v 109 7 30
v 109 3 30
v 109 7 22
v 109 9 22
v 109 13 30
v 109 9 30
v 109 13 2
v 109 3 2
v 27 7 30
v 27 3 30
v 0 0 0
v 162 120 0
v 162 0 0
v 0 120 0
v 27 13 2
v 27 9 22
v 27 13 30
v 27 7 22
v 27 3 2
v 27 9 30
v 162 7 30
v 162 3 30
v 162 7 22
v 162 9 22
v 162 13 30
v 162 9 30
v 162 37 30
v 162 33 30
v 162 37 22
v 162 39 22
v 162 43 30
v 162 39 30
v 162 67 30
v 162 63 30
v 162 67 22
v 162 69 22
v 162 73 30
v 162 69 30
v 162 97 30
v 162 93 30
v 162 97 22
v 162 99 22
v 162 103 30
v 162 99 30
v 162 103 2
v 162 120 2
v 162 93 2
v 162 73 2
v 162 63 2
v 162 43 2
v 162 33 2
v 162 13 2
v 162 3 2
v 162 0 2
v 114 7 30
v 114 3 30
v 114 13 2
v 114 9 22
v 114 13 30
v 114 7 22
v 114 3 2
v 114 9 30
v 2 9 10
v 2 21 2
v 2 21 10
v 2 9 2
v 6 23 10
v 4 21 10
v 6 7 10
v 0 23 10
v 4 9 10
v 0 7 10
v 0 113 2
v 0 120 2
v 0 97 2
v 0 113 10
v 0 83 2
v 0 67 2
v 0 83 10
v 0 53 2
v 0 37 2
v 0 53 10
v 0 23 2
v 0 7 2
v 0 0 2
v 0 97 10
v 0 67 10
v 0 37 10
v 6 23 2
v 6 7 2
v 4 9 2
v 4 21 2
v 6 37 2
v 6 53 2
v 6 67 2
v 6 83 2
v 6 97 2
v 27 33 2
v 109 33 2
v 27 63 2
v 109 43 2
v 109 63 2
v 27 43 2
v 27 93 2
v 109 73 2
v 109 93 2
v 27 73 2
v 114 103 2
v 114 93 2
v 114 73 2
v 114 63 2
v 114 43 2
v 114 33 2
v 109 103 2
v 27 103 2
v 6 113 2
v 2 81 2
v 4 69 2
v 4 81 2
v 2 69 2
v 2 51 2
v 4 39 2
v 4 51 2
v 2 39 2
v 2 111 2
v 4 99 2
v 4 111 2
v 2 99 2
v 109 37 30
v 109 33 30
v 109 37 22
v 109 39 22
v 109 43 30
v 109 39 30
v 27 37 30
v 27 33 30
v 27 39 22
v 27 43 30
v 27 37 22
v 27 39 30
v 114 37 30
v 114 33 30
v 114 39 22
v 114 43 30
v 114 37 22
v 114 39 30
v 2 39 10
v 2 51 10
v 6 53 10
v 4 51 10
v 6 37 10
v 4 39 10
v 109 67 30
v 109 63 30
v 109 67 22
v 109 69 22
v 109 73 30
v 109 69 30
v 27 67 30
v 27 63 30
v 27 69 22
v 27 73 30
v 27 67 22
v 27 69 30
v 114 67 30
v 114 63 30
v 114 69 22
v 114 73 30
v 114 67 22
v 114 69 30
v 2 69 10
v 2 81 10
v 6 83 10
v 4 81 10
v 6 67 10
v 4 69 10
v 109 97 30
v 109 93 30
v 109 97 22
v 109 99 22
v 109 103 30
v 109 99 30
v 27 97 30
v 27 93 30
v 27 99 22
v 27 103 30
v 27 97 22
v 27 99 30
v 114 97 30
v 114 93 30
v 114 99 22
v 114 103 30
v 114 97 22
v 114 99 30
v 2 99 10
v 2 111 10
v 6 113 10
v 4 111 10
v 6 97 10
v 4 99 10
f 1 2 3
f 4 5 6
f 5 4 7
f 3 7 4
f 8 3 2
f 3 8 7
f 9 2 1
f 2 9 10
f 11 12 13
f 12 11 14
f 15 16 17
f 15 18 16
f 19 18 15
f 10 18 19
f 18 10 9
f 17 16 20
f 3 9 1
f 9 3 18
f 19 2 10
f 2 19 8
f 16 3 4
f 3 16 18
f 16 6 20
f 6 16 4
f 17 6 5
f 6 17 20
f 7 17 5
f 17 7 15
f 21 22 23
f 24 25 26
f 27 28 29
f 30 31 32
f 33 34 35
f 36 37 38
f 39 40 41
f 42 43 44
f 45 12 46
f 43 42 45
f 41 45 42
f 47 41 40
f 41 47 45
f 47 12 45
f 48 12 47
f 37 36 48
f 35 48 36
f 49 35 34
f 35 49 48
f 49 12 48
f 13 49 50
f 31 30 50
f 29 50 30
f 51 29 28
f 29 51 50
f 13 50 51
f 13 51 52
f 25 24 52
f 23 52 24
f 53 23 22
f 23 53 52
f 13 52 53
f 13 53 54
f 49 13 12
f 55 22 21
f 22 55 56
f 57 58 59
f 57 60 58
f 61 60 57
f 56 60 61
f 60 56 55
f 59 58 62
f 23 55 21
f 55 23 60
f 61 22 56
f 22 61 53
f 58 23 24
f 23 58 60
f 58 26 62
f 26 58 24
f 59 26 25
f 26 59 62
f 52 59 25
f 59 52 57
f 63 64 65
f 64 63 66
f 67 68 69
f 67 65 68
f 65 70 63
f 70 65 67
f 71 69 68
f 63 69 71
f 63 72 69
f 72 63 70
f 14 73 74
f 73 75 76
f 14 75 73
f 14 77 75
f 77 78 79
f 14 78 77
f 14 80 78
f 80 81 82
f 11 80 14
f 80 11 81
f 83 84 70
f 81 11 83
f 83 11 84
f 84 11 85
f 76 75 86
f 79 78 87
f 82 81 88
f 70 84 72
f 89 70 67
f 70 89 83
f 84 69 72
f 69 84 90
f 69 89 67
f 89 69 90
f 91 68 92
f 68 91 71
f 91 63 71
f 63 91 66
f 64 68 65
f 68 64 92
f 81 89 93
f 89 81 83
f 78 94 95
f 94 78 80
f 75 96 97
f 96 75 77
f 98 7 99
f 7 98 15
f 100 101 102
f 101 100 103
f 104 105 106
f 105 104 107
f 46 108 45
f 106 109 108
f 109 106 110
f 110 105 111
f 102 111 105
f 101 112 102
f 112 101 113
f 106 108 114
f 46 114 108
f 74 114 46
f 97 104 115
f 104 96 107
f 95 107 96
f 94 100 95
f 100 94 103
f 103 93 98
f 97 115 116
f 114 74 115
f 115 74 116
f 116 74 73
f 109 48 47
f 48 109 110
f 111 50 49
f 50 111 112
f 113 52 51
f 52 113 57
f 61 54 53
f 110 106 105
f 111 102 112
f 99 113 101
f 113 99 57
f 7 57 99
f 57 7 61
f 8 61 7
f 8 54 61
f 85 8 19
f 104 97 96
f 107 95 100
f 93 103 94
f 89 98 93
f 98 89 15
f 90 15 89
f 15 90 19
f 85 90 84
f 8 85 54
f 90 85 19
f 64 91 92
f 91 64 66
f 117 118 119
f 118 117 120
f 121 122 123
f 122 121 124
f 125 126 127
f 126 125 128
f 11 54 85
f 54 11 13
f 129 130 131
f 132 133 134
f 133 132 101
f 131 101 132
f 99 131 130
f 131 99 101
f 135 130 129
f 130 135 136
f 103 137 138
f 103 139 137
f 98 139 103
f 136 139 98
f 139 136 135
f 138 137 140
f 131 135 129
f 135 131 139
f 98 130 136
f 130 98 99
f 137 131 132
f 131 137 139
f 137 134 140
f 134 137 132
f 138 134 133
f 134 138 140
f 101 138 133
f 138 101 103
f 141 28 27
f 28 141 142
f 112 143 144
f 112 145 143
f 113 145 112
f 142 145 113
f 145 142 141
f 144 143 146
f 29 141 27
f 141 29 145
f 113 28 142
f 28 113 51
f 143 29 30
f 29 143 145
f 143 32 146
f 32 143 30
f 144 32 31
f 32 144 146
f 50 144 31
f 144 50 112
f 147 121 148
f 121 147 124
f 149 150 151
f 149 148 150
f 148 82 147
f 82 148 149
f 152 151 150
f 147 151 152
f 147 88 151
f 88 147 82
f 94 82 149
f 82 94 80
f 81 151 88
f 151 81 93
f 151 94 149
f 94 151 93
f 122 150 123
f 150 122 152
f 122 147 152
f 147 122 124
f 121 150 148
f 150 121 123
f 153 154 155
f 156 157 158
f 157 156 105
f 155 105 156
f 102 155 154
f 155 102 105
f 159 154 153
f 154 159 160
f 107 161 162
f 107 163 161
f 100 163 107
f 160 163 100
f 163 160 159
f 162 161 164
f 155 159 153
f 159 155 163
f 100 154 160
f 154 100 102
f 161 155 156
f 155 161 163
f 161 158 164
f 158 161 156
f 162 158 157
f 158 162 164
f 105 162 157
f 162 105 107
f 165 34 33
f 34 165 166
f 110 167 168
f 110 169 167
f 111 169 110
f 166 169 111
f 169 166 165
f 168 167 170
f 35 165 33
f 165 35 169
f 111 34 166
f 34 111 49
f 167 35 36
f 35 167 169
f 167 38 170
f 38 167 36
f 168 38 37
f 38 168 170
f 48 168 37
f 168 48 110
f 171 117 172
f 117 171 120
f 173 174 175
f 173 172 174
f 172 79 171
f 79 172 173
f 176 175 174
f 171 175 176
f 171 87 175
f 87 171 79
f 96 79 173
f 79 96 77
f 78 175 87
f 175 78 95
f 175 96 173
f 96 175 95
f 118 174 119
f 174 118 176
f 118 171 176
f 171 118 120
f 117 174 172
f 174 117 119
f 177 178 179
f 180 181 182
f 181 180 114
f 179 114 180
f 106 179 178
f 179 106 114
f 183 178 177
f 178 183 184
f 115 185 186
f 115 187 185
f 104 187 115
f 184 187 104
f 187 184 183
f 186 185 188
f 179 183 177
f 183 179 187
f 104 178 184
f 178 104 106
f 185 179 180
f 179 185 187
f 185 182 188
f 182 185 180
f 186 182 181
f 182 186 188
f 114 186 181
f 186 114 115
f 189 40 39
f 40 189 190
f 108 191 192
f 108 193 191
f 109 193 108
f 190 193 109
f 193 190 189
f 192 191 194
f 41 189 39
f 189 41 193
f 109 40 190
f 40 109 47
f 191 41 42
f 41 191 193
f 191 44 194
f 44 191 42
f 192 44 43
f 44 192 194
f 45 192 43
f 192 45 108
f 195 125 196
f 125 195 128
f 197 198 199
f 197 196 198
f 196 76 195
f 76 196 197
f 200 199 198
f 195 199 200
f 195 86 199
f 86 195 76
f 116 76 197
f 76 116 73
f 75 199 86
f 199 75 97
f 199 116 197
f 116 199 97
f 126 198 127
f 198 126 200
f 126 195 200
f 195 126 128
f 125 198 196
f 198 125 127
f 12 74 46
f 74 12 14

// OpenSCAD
// file: ../cardshowcase.scad
module base_tarjeta(desplazamiento, posicion_tarjeta, longitud_tarjeta, altura_borde_tarjeta, altura_interior_tarjeta)
{
    color("purple") translate([ posicion_tarjeta, desplazamiento + 1, 0 ])
        cube([ longitud_tarjeta, 4, altura_borde_tarjeta + 2 ]);

    color("pink") translate([ posicion_tarjeta, desplazamiento + 5, 0 ])
        cube([ longitud_tarjeta, 2, altura_interior_tarjeta + 2 ]);

    color("purple") translate([ posicion_tarjeta, desplazamiento + 7, 0 ])
        cube([ longitud_tarjeta, 4, altura_borde_tarjeta + 2 ]);
}

module base_tarjeta_corta(desplazamiento, posicion_tarjeta, longitud_tarjeta, altura_borde_tarjeta,
                          altura_interior_tarjeta, tab_size)
{
    color("purple") translate([ posicion_tarjeta, desplazamiento + 1, 0 ])
        cube([ tab_size, 4, altura_borde_tarjeta + 2 ]);

    color("pink") translate([ posicion_tarjeta, desplazamiento + 5, 0 ])
        cube([ tab_size, 2, altura_interior_tarjeta + 2 ]);

    color("purple") translate([ posicion_tarjeta, desplazamiento + 7, 0 ])
        cube([ tab_size, 4, altura_borde_tarjeta + 2 ]);

    color("purple") translate([ longitud_tarjeta + posicion_tarjeta - tab_size, desplazamiento + 1, 0 ])
        cube([ tab_size, 4, altura_borde_tarjeta + 2 ]);

    color("pink") translate([ longitud_tarjeta + posicion_tarjeta - tab_size, desplazamiento + 5, 0 ])
        cube([ tab_size, 2, altura_interior_tarjeta + 2 ]);

    color("purple") translate([ longitud_tarjeta + posicion_tarjeta - tab_size, desplazamiento + 7, 0 ])
        cube([ tab_size, 4, altura_borde_tarjeta + 2 ]);
}

module soporte_tarjeta(tipo, size)
{
    if (tipo == "ISA8")
    {
        desplazamiento = 2;
        posicion_tarjeta = 27;
        longitud_tarjeta = 82;
        altura_borde_tarjeta = 28;
        altura_interior_tarjeta = 20;

        if (size == 0)
        {
            base_tarjeta(desplazamiento, posicion_tarjeta, longitud_tarjeta, altura_borde_tarjeta,
                         altura_interior_tarjeta);
        }
        else
        {
            base_tarjeta_corta(desplazamiento, posicion_tarjeta, longitud_tarjeta, altura_borde_tarjeta,
                               altura_interior_tarjeta, size);
        }
    }
    else if (tipo == "ISA16")
    {
        soporte_tarjeta("ISA8", size);

        desplazamiento = 2;
        posicion_tarjeta = 28 + 81 + 5;
        longitud_tarjeta = 48;
        altura_borde_tarjeta = 28;
        altura_interior_tarjeta = 20;

        if (size == 0)
        {
            base_tarjeta(desplazamiento, posicion_tarjeta, longitud_tarjeta, altura_borde_tarjeta,
                         altura_interior_tarjeta);
        }
        else
        {
            base_tarjeta_corta(desplazamiento, posicion_tarjeta, longitud_tarjeta, altura_borde_tarjeta,
                               altura_interior_tarjeta, size);
        }
    }
    else if (tipo == "VLB")
    {
        soporte_tarjeta("ISA16", size);

        desplazamiento = 2;
        posicion_tarjeta = 28 + 135 + 8;
        longitud_tarjeta = 75;
        altura_borde_tarjeta = 28;
        altura_interior_tarjeta = 20;

        if (size == 0)
        {
            base_tarjeta(desplazamiento, posicion_tarjeta, longitud_tarjeta, altura_borde_tarjeta,
                         altura_interior_tarjeta);
        }
        else
        {
            base_tarjeta_corta(desplazamiento, posicion_tarjeta, longitud_tarjeta, altura_borde_tarjeta,
                               altura_interior_tarjeta, size);
        }
    }
    else if (tipo == "PCI")
    {
        desplazamiento = 16;
        posicion_tarjeta = 43;
        longitud_tarjeta = 82;
        altura_borde_tarjeta = 28;
        altura_interior_tarjeta = 20;

        if (size == 0)
        {
            base_tarjeta(desplazamiento, posicion_tarjeta, longitud_tarjeta, altura_borde_tarjeta,
                         altura_interior_tarjeta);
        }
        else
        {
            base_tarjeta_corta(desplazamiento, posicion_tarjeta, longitud_tarjeta, altura_borde_tarjeta,
                               altura_interior_tarjeta, size);
        }
    }
    else if (tipo == "PCIe16")
    {
        desplazamiento = 16;
        posicion_tarjeta = 50;
        longitud_tarjeta = 85;
        altura_borde_tarjeta = 24;
        altura_interior_tarjeta = 16;

        if (size == 0)
        {
            base_tarjeta(desplazamiento, posicion_tarjeta, longitud_tarjeta, altura_borde_tarjeta,
                         altura_interior_tarjeta);
        }
        else
        {
            base_tarjeta_corta(desplazamiento, posicion_tarjeta, longitud_tarjeta, altura_borde_tarjeta,
                               altura_interior_tarjeta, size);
        }
    }
    else if (tipo == "PCIe8")
    {
        desplazamiento = 16;
        posicion_tarjeta = 50;
        longitud_tarjeta = 52;
        altura_borde_tarjeta = 24;
        altura_interior_tarjeta = 16;

        if (size == 0)
        {
            base_tarjeta(desplazamiento, posicion_tarjeta, longitud_tarjeta, altura_borde_tarjeta,
                         altura_interior_tarjeta);
        }
        else
        {
            base_tarjeta_corta(desplazamiento, posicion_tarjeta, longitud_tarjeta, altura_borde_tarjeta,
                               altura_interior_tarjeta, size);
        }
    }
    else if (tipo == "PCIe4")
    {
        desplazamiento = 16;
        posicion_tarjeta = 50;
        longitud_tarjeta = 35;
        altura_borde_tarjeta = 24;
        altura_interior_tarjeta = 16;

        if (size == 0)
        {
            base_tarjeta(desplazamiento, posicion_tarjeta, longitud_tarjeta, altura_borde_tarjeta,
                         altura_interior_tarjeta);
        }
        else
        {
            base_tarjeta_corta(desplazamiento, posicion_tarjeta, longitud_tarjeta, altura_borde_tarjeta,
                               altura_interior_tarjeta, size);
        }
    }
    else if (tipo == "PCIe1")
    {
        desplazamiento = 16;
        posicion_tarjeta = 50;
        longitud_tarjeta = 21;
        altura_borde_tarjeta = 24;
        altura_interior_tarjeta = 16;

        if (size == 0)
        {
            base_tarjeta(desplazamiento, posicion_tarjeta, longitud_tarjeta, altura_borde_tarjeta,
                         altura_interior_tarjeta);
        }
        else
        {
            base_tarjeta_corta(desplazamiento, posicion_tarjeta, longitud_tarjeta, altura_borde_tarjeta,
                               altura_interior_tarjeta, size);
        }
    }
    else if (tipo == "AGP")
    {
        desplazamiento = 16;
        posicion_tarjeta = 70;
        longitud_tarjeta = 68;
        altura_borde_tarjeta = 28;
        altura_interior_tarjeta = 20;

        if (size == 0)
        {
            base_tarjeta(desplazamiento, posicion_tarjeta, longitud_tarjeta, altura_borde_tarjeta,
                         altura_interior_tarjeta);
        }
        else
        {
            base_tarjeta_corta(desplazamiento, posicion_tarjeta, longitud_tarjeta, altura_borde_tarjeta,
                               altura_interior_tarjeta, size);
        }
    }
    else if (tipo == "EISA")
    {
        desplazamiento = 2;
        posicion_tarjeta = 27;
        longitud_tarjeta = 52 + 83;
        altura_borde_tarjeta = 28;
        altura_interior_tarjeta = 15;

        if (size == 0)
        {
            base_tarjeta(desplazamiento, posicion_tarjeta, longitud_tarjeta, altura_borde_tarjeta,
                         altura_interior_tarjeta);
        }
        else
        {
            base_tarjeta_corta(desplazamiento, posicion_tarjeta, longitud_tarjeta, altura_borde_tarjeta,
                               altura_interior_tarjeta, size);
        }
    }
}

module base_placa(tipo)
{
    if (tipo == "ISA8")
    {
        color("cyan") cube([ 109, 30, 2 ]);
    }
    else if (tipo == "ISA16")
    {
        color("cyan") cube([ 162, 30, 2 ]);
    }
    else if (tipo == "VLB")
    {
        color("cyan") cube([ 246, 30, 2 ]);
    }
    else if (tipo == "PCI")
    {
        color("cyan") cube([ 125, 30, 2 ]);
    }
    else if (tipo == "PCIe16")
    {
        color("cyan") cube([ 135, 30, 2 ]);
    }
    else if (tipo == "PCIe8")
    {
        color("cyan") cube([ 102, 30, 2 ]);
    }
    else if (tipo == "PCIe4")
    {
        color("cyan") cube([ 85, 30, 2 ]);
    }
    else if (tipo == "PCIe1")
    {
        color("cyan") cube([ 71, 30, 2 ]);
    }
    else if (tipo == "AGP")
    {
        color("cyan") cube([ 138, 30, 2 ]);
    }
    else if (tipo == "EISA")
    {
        color("cyan") cube([ 162, 30, 2 ]);
    }
    else if (is_num(tipo))
    {
        color("cyan") cube([ tipo, 30, 2]);
    }
}

override_base = undef;

module base(tipo)
{
    if (override_base == undef)
    {
        base_placa(tipo);
    }
    else
    {
        base_placa(override_base);
    }
}

module single_slot(tipo, position, size = 0)
{
    displacement = position * 30;

    color("red") translate([ 0, 7 + displacement, 0 ]) cube([ 2, 16, 10 ]);

    color("red") translate([ 4, 7 + displacement, 0 ]) cube([ 2, 16, 10 ]);

    color("red") translate([ 2, 7 + displacement, 0 ]) cube([ 2, 2, 10 ]);

    color("red") translate([ 2, 21 + displacement, 0 ]) cube([ 2, 2, 10 ]);

    translate([ 0, displacement, 0 ]) soporte_tarjeta(tipo, size);
    translate([ 0, displacement, 0 ]) base(tipo);
}
// main file
include <../cardshowcase.scad>

for ( i = [0 : 3] ){
    single_slot("ISA16", i);
}
